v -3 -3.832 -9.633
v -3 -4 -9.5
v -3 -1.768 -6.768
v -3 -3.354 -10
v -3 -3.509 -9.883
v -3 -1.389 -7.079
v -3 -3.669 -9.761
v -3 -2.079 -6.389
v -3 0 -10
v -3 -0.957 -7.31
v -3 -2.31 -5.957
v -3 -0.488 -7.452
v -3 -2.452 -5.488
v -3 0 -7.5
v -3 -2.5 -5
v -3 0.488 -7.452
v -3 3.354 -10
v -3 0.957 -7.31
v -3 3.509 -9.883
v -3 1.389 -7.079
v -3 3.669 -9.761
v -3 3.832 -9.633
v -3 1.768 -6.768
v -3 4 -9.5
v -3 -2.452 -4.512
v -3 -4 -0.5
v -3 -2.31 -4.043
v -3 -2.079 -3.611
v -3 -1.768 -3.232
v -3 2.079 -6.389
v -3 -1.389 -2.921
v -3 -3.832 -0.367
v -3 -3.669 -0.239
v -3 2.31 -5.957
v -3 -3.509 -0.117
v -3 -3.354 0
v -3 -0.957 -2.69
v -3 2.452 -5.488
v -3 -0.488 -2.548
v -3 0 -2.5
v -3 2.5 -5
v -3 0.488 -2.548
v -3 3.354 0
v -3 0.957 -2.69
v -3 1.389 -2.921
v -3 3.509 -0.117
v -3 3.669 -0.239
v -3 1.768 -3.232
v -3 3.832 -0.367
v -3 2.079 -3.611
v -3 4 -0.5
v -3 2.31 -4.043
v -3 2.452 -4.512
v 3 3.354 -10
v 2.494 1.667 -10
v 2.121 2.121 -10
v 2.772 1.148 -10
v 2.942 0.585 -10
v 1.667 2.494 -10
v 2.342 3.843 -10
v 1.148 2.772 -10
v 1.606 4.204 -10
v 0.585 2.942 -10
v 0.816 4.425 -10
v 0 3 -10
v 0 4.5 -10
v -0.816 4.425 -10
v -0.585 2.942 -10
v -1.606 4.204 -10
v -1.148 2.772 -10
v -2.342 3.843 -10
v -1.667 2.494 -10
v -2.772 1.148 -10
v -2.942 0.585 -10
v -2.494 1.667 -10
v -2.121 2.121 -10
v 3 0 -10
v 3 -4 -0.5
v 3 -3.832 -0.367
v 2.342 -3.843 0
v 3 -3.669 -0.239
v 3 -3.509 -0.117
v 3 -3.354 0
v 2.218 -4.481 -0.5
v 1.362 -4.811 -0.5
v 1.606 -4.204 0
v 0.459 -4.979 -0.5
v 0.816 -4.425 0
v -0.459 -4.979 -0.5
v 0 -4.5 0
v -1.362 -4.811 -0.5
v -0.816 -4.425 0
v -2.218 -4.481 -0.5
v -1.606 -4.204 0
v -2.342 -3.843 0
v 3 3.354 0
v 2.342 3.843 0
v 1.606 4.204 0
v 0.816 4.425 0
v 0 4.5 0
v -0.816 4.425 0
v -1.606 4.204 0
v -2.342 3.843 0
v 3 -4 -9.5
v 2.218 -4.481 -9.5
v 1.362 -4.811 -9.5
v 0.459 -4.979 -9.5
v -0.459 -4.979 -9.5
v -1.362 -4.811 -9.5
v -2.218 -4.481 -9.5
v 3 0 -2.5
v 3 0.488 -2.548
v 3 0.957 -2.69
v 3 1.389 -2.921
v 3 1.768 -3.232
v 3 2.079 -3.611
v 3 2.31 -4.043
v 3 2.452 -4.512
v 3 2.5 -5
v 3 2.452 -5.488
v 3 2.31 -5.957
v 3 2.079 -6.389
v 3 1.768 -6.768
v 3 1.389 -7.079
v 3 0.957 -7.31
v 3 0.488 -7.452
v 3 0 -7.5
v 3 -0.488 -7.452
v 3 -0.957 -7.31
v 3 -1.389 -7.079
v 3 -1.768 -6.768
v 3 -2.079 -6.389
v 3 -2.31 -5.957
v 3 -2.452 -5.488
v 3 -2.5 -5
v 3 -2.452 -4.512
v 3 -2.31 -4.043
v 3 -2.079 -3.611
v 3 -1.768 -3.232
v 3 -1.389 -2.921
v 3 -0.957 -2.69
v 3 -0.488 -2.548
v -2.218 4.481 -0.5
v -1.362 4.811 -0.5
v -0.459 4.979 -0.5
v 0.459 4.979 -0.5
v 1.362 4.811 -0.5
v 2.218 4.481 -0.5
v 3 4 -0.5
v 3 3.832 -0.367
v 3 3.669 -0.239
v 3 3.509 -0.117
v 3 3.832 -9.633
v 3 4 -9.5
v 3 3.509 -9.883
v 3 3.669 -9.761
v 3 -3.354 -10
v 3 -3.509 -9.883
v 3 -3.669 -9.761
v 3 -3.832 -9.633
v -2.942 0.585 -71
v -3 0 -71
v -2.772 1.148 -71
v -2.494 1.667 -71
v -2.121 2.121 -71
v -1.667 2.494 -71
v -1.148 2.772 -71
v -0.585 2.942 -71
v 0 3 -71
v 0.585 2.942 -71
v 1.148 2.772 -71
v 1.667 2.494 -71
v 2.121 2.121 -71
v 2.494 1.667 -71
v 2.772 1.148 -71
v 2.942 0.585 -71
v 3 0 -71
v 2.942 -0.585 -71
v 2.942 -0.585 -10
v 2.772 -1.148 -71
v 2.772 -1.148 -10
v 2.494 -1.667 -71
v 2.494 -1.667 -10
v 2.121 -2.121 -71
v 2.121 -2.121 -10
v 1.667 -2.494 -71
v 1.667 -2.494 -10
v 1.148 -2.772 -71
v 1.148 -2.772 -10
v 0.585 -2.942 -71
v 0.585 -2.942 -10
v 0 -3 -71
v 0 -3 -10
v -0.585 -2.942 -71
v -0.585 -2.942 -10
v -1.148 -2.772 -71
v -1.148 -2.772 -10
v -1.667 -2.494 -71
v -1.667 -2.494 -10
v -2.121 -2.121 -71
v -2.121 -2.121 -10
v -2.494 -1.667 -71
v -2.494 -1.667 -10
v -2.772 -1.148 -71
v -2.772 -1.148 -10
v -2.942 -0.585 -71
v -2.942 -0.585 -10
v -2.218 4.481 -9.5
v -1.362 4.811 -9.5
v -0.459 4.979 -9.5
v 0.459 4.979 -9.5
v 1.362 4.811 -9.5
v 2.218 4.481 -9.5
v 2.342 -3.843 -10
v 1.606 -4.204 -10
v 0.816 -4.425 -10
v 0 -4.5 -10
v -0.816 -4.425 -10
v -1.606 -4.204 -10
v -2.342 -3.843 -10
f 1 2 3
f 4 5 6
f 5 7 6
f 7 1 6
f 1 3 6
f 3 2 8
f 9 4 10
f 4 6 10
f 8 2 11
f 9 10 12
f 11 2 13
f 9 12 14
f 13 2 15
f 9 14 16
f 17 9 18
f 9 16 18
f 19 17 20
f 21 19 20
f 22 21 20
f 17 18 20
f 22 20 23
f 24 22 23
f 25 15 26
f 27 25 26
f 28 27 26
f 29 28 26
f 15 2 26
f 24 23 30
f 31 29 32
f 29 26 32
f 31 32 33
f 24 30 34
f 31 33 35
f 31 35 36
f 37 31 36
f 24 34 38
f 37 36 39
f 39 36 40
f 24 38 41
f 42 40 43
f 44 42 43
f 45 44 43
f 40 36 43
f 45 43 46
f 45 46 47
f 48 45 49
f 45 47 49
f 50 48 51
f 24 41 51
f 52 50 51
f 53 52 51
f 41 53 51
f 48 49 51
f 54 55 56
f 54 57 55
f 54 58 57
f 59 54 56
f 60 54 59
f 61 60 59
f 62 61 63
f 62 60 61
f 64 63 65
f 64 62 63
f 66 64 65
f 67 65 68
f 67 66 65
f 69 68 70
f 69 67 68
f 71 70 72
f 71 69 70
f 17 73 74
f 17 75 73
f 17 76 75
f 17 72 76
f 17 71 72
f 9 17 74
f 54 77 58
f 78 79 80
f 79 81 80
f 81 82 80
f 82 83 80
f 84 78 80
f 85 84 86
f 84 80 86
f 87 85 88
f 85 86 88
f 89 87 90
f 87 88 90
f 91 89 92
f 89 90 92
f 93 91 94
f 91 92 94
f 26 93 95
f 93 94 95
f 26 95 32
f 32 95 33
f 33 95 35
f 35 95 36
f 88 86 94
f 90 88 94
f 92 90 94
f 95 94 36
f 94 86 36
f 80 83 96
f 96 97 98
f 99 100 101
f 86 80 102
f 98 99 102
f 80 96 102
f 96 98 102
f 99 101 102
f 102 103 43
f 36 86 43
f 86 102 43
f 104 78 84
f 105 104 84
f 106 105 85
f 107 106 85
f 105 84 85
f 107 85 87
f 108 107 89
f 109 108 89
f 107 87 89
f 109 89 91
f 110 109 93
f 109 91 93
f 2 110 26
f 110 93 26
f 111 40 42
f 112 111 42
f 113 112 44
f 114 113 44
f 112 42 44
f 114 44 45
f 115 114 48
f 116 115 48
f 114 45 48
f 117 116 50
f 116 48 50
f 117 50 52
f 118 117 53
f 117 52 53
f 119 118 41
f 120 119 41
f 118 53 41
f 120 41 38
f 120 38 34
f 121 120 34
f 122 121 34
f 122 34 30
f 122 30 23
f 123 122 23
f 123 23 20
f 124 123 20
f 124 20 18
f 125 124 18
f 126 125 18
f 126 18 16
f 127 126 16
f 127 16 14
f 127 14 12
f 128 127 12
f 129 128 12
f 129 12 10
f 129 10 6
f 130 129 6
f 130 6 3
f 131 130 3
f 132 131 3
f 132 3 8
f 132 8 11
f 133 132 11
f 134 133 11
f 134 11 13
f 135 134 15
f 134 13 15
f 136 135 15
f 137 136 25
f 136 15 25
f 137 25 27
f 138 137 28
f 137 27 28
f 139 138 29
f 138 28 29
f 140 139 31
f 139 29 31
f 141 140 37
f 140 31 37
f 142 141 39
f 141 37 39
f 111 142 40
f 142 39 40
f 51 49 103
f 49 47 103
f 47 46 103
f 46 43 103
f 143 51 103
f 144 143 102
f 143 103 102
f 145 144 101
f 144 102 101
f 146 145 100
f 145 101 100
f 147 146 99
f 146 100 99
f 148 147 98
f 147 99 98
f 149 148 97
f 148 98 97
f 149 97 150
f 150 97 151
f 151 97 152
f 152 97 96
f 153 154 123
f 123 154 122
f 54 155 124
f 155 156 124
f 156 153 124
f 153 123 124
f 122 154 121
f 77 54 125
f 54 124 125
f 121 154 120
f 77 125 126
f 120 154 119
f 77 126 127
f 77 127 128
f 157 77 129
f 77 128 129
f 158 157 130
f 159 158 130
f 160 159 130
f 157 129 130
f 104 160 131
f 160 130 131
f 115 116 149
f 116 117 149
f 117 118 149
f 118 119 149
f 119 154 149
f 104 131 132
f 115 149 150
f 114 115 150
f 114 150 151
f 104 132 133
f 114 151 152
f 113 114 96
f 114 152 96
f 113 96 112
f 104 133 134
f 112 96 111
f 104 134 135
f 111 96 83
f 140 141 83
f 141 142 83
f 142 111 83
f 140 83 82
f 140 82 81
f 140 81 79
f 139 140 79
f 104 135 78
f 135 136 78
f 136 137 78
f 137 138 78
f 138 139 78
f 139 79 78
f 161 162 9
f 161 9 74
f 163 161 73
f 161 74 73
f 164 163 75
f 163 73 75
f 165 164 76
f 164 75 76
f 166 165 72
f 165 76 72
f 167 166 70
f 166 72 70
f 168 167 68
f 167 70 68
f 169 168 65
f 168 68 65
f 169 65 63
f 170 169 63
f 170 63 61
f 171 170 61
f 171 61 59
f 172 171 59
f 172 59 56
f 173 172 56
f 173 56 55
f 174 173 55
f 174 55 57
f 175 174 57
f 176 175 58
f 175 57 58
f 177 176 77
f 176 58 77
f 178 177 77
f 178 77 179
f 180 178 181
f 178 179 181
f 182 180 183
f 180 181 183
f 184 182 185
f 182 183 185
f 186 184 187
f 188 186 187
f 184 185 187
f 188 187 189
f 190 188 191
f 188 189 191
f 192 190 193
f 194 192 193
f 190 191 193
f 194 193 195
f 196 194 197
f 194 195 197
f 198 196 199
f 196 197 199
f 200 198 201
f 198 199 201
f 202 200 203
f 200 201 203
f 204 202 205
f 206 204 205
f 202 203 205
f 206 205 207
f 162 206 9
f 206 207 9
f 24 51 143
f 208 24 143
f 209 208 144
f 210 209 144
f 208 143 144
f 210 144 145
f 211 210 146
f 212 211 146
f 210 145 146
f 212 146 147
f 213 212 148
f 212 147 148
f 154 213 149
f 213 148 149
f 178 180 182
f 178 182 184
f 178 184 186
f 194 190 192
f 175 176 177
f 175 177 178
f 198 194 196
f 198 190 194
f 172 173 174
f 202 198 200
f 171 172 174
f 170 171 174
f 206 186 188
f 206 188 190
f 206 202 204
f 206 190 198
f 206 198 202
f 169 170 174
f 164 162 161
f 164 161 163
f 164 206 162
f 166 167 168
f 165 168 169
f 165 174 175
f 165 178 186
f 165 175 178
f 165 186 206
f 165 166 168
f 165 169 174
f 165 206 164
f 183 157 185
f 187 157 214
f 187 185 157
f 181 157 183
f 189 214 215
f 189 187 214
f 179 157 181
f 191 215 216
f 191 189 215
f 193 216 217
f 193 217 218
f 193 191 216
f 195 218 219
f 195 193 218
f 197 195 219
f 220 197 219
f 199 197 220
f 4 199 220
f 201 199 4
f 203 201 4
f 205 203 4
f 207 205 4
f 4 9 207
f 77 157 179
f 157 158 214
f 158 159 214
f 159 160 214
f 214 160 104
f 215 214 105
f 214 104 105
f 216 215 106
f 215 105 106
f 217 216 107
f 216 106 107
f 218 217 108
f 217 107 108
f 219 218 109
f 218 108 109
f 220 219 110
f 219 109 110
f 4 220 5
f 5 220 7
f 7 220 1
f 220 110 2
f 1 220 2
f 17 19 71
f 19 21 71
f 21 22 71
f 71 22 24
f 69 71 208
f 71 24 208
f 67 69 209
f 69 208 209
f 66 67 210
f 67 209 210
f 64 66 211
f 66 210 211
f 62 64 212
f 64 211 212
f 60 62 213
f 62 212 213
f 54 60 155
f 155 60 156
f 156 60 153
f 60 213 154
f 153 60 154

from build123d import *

# Parameters (mm, degrees)
BOSS_EXTRUDE1_DEPTH = 10
SKETCH2_R           = 3
BOSS_EXTRUDE2_DEPTH = 61
CHAMFER1_SIZE       = 0.5
SKETCH3_R           = 2.5
CUT_EXTRUDE1_DEPTH  = 61


with BuildPart() as part:
    # Sketch1 → Boss-Extrude1 (new body)
    with BuildSketch(Plane.XY):
        with BuildLine():
            Line((3, 4), (3, -4))
            ThreePointArc((3, -4), (0, -5), (-3, -4))
            Line((-3, -4), (-3, 4))
            ThreePointArc((-3, 4), (0, 5), (3, 4))
        make_face()
    extrude(amount=-BOSS_EXTRUDE1_DEPTH)

    # Sketch2 → Boss-Extrude2 (add)
    with BuildSketch(Plane(origin=(0, 0, -10), x_dir=(-1, 0, 0), z_dir=(0, 0, -1))):
        Circle(SKETCH2_R)
    extrude(amount=BOSS_EXTRUDE2_DEPTH)

    # Chamfer1
    chamfer1_edges = [part.edges().sort_by_distance(p)[0] for p in [
        (0, -5, -10),
        (0, 5, -10),
        (0, -5, 0),
        (0, 5, 0),
    ]]
    chamfer(chamfer1_edges, length=CHAMFER1_SIZE)

    # Sketch3 → Cut-Extrude1 (cut)
    with BuildSketch(Plane.ZY.offset(3)):
        with Locations((-5, 0)):
            Circle(SKETCH3_R)
    extrude(amount=-CUT_EXTRUDE1_DEPTH, mode=Mode.SUBTRACT)


solid = part.part
